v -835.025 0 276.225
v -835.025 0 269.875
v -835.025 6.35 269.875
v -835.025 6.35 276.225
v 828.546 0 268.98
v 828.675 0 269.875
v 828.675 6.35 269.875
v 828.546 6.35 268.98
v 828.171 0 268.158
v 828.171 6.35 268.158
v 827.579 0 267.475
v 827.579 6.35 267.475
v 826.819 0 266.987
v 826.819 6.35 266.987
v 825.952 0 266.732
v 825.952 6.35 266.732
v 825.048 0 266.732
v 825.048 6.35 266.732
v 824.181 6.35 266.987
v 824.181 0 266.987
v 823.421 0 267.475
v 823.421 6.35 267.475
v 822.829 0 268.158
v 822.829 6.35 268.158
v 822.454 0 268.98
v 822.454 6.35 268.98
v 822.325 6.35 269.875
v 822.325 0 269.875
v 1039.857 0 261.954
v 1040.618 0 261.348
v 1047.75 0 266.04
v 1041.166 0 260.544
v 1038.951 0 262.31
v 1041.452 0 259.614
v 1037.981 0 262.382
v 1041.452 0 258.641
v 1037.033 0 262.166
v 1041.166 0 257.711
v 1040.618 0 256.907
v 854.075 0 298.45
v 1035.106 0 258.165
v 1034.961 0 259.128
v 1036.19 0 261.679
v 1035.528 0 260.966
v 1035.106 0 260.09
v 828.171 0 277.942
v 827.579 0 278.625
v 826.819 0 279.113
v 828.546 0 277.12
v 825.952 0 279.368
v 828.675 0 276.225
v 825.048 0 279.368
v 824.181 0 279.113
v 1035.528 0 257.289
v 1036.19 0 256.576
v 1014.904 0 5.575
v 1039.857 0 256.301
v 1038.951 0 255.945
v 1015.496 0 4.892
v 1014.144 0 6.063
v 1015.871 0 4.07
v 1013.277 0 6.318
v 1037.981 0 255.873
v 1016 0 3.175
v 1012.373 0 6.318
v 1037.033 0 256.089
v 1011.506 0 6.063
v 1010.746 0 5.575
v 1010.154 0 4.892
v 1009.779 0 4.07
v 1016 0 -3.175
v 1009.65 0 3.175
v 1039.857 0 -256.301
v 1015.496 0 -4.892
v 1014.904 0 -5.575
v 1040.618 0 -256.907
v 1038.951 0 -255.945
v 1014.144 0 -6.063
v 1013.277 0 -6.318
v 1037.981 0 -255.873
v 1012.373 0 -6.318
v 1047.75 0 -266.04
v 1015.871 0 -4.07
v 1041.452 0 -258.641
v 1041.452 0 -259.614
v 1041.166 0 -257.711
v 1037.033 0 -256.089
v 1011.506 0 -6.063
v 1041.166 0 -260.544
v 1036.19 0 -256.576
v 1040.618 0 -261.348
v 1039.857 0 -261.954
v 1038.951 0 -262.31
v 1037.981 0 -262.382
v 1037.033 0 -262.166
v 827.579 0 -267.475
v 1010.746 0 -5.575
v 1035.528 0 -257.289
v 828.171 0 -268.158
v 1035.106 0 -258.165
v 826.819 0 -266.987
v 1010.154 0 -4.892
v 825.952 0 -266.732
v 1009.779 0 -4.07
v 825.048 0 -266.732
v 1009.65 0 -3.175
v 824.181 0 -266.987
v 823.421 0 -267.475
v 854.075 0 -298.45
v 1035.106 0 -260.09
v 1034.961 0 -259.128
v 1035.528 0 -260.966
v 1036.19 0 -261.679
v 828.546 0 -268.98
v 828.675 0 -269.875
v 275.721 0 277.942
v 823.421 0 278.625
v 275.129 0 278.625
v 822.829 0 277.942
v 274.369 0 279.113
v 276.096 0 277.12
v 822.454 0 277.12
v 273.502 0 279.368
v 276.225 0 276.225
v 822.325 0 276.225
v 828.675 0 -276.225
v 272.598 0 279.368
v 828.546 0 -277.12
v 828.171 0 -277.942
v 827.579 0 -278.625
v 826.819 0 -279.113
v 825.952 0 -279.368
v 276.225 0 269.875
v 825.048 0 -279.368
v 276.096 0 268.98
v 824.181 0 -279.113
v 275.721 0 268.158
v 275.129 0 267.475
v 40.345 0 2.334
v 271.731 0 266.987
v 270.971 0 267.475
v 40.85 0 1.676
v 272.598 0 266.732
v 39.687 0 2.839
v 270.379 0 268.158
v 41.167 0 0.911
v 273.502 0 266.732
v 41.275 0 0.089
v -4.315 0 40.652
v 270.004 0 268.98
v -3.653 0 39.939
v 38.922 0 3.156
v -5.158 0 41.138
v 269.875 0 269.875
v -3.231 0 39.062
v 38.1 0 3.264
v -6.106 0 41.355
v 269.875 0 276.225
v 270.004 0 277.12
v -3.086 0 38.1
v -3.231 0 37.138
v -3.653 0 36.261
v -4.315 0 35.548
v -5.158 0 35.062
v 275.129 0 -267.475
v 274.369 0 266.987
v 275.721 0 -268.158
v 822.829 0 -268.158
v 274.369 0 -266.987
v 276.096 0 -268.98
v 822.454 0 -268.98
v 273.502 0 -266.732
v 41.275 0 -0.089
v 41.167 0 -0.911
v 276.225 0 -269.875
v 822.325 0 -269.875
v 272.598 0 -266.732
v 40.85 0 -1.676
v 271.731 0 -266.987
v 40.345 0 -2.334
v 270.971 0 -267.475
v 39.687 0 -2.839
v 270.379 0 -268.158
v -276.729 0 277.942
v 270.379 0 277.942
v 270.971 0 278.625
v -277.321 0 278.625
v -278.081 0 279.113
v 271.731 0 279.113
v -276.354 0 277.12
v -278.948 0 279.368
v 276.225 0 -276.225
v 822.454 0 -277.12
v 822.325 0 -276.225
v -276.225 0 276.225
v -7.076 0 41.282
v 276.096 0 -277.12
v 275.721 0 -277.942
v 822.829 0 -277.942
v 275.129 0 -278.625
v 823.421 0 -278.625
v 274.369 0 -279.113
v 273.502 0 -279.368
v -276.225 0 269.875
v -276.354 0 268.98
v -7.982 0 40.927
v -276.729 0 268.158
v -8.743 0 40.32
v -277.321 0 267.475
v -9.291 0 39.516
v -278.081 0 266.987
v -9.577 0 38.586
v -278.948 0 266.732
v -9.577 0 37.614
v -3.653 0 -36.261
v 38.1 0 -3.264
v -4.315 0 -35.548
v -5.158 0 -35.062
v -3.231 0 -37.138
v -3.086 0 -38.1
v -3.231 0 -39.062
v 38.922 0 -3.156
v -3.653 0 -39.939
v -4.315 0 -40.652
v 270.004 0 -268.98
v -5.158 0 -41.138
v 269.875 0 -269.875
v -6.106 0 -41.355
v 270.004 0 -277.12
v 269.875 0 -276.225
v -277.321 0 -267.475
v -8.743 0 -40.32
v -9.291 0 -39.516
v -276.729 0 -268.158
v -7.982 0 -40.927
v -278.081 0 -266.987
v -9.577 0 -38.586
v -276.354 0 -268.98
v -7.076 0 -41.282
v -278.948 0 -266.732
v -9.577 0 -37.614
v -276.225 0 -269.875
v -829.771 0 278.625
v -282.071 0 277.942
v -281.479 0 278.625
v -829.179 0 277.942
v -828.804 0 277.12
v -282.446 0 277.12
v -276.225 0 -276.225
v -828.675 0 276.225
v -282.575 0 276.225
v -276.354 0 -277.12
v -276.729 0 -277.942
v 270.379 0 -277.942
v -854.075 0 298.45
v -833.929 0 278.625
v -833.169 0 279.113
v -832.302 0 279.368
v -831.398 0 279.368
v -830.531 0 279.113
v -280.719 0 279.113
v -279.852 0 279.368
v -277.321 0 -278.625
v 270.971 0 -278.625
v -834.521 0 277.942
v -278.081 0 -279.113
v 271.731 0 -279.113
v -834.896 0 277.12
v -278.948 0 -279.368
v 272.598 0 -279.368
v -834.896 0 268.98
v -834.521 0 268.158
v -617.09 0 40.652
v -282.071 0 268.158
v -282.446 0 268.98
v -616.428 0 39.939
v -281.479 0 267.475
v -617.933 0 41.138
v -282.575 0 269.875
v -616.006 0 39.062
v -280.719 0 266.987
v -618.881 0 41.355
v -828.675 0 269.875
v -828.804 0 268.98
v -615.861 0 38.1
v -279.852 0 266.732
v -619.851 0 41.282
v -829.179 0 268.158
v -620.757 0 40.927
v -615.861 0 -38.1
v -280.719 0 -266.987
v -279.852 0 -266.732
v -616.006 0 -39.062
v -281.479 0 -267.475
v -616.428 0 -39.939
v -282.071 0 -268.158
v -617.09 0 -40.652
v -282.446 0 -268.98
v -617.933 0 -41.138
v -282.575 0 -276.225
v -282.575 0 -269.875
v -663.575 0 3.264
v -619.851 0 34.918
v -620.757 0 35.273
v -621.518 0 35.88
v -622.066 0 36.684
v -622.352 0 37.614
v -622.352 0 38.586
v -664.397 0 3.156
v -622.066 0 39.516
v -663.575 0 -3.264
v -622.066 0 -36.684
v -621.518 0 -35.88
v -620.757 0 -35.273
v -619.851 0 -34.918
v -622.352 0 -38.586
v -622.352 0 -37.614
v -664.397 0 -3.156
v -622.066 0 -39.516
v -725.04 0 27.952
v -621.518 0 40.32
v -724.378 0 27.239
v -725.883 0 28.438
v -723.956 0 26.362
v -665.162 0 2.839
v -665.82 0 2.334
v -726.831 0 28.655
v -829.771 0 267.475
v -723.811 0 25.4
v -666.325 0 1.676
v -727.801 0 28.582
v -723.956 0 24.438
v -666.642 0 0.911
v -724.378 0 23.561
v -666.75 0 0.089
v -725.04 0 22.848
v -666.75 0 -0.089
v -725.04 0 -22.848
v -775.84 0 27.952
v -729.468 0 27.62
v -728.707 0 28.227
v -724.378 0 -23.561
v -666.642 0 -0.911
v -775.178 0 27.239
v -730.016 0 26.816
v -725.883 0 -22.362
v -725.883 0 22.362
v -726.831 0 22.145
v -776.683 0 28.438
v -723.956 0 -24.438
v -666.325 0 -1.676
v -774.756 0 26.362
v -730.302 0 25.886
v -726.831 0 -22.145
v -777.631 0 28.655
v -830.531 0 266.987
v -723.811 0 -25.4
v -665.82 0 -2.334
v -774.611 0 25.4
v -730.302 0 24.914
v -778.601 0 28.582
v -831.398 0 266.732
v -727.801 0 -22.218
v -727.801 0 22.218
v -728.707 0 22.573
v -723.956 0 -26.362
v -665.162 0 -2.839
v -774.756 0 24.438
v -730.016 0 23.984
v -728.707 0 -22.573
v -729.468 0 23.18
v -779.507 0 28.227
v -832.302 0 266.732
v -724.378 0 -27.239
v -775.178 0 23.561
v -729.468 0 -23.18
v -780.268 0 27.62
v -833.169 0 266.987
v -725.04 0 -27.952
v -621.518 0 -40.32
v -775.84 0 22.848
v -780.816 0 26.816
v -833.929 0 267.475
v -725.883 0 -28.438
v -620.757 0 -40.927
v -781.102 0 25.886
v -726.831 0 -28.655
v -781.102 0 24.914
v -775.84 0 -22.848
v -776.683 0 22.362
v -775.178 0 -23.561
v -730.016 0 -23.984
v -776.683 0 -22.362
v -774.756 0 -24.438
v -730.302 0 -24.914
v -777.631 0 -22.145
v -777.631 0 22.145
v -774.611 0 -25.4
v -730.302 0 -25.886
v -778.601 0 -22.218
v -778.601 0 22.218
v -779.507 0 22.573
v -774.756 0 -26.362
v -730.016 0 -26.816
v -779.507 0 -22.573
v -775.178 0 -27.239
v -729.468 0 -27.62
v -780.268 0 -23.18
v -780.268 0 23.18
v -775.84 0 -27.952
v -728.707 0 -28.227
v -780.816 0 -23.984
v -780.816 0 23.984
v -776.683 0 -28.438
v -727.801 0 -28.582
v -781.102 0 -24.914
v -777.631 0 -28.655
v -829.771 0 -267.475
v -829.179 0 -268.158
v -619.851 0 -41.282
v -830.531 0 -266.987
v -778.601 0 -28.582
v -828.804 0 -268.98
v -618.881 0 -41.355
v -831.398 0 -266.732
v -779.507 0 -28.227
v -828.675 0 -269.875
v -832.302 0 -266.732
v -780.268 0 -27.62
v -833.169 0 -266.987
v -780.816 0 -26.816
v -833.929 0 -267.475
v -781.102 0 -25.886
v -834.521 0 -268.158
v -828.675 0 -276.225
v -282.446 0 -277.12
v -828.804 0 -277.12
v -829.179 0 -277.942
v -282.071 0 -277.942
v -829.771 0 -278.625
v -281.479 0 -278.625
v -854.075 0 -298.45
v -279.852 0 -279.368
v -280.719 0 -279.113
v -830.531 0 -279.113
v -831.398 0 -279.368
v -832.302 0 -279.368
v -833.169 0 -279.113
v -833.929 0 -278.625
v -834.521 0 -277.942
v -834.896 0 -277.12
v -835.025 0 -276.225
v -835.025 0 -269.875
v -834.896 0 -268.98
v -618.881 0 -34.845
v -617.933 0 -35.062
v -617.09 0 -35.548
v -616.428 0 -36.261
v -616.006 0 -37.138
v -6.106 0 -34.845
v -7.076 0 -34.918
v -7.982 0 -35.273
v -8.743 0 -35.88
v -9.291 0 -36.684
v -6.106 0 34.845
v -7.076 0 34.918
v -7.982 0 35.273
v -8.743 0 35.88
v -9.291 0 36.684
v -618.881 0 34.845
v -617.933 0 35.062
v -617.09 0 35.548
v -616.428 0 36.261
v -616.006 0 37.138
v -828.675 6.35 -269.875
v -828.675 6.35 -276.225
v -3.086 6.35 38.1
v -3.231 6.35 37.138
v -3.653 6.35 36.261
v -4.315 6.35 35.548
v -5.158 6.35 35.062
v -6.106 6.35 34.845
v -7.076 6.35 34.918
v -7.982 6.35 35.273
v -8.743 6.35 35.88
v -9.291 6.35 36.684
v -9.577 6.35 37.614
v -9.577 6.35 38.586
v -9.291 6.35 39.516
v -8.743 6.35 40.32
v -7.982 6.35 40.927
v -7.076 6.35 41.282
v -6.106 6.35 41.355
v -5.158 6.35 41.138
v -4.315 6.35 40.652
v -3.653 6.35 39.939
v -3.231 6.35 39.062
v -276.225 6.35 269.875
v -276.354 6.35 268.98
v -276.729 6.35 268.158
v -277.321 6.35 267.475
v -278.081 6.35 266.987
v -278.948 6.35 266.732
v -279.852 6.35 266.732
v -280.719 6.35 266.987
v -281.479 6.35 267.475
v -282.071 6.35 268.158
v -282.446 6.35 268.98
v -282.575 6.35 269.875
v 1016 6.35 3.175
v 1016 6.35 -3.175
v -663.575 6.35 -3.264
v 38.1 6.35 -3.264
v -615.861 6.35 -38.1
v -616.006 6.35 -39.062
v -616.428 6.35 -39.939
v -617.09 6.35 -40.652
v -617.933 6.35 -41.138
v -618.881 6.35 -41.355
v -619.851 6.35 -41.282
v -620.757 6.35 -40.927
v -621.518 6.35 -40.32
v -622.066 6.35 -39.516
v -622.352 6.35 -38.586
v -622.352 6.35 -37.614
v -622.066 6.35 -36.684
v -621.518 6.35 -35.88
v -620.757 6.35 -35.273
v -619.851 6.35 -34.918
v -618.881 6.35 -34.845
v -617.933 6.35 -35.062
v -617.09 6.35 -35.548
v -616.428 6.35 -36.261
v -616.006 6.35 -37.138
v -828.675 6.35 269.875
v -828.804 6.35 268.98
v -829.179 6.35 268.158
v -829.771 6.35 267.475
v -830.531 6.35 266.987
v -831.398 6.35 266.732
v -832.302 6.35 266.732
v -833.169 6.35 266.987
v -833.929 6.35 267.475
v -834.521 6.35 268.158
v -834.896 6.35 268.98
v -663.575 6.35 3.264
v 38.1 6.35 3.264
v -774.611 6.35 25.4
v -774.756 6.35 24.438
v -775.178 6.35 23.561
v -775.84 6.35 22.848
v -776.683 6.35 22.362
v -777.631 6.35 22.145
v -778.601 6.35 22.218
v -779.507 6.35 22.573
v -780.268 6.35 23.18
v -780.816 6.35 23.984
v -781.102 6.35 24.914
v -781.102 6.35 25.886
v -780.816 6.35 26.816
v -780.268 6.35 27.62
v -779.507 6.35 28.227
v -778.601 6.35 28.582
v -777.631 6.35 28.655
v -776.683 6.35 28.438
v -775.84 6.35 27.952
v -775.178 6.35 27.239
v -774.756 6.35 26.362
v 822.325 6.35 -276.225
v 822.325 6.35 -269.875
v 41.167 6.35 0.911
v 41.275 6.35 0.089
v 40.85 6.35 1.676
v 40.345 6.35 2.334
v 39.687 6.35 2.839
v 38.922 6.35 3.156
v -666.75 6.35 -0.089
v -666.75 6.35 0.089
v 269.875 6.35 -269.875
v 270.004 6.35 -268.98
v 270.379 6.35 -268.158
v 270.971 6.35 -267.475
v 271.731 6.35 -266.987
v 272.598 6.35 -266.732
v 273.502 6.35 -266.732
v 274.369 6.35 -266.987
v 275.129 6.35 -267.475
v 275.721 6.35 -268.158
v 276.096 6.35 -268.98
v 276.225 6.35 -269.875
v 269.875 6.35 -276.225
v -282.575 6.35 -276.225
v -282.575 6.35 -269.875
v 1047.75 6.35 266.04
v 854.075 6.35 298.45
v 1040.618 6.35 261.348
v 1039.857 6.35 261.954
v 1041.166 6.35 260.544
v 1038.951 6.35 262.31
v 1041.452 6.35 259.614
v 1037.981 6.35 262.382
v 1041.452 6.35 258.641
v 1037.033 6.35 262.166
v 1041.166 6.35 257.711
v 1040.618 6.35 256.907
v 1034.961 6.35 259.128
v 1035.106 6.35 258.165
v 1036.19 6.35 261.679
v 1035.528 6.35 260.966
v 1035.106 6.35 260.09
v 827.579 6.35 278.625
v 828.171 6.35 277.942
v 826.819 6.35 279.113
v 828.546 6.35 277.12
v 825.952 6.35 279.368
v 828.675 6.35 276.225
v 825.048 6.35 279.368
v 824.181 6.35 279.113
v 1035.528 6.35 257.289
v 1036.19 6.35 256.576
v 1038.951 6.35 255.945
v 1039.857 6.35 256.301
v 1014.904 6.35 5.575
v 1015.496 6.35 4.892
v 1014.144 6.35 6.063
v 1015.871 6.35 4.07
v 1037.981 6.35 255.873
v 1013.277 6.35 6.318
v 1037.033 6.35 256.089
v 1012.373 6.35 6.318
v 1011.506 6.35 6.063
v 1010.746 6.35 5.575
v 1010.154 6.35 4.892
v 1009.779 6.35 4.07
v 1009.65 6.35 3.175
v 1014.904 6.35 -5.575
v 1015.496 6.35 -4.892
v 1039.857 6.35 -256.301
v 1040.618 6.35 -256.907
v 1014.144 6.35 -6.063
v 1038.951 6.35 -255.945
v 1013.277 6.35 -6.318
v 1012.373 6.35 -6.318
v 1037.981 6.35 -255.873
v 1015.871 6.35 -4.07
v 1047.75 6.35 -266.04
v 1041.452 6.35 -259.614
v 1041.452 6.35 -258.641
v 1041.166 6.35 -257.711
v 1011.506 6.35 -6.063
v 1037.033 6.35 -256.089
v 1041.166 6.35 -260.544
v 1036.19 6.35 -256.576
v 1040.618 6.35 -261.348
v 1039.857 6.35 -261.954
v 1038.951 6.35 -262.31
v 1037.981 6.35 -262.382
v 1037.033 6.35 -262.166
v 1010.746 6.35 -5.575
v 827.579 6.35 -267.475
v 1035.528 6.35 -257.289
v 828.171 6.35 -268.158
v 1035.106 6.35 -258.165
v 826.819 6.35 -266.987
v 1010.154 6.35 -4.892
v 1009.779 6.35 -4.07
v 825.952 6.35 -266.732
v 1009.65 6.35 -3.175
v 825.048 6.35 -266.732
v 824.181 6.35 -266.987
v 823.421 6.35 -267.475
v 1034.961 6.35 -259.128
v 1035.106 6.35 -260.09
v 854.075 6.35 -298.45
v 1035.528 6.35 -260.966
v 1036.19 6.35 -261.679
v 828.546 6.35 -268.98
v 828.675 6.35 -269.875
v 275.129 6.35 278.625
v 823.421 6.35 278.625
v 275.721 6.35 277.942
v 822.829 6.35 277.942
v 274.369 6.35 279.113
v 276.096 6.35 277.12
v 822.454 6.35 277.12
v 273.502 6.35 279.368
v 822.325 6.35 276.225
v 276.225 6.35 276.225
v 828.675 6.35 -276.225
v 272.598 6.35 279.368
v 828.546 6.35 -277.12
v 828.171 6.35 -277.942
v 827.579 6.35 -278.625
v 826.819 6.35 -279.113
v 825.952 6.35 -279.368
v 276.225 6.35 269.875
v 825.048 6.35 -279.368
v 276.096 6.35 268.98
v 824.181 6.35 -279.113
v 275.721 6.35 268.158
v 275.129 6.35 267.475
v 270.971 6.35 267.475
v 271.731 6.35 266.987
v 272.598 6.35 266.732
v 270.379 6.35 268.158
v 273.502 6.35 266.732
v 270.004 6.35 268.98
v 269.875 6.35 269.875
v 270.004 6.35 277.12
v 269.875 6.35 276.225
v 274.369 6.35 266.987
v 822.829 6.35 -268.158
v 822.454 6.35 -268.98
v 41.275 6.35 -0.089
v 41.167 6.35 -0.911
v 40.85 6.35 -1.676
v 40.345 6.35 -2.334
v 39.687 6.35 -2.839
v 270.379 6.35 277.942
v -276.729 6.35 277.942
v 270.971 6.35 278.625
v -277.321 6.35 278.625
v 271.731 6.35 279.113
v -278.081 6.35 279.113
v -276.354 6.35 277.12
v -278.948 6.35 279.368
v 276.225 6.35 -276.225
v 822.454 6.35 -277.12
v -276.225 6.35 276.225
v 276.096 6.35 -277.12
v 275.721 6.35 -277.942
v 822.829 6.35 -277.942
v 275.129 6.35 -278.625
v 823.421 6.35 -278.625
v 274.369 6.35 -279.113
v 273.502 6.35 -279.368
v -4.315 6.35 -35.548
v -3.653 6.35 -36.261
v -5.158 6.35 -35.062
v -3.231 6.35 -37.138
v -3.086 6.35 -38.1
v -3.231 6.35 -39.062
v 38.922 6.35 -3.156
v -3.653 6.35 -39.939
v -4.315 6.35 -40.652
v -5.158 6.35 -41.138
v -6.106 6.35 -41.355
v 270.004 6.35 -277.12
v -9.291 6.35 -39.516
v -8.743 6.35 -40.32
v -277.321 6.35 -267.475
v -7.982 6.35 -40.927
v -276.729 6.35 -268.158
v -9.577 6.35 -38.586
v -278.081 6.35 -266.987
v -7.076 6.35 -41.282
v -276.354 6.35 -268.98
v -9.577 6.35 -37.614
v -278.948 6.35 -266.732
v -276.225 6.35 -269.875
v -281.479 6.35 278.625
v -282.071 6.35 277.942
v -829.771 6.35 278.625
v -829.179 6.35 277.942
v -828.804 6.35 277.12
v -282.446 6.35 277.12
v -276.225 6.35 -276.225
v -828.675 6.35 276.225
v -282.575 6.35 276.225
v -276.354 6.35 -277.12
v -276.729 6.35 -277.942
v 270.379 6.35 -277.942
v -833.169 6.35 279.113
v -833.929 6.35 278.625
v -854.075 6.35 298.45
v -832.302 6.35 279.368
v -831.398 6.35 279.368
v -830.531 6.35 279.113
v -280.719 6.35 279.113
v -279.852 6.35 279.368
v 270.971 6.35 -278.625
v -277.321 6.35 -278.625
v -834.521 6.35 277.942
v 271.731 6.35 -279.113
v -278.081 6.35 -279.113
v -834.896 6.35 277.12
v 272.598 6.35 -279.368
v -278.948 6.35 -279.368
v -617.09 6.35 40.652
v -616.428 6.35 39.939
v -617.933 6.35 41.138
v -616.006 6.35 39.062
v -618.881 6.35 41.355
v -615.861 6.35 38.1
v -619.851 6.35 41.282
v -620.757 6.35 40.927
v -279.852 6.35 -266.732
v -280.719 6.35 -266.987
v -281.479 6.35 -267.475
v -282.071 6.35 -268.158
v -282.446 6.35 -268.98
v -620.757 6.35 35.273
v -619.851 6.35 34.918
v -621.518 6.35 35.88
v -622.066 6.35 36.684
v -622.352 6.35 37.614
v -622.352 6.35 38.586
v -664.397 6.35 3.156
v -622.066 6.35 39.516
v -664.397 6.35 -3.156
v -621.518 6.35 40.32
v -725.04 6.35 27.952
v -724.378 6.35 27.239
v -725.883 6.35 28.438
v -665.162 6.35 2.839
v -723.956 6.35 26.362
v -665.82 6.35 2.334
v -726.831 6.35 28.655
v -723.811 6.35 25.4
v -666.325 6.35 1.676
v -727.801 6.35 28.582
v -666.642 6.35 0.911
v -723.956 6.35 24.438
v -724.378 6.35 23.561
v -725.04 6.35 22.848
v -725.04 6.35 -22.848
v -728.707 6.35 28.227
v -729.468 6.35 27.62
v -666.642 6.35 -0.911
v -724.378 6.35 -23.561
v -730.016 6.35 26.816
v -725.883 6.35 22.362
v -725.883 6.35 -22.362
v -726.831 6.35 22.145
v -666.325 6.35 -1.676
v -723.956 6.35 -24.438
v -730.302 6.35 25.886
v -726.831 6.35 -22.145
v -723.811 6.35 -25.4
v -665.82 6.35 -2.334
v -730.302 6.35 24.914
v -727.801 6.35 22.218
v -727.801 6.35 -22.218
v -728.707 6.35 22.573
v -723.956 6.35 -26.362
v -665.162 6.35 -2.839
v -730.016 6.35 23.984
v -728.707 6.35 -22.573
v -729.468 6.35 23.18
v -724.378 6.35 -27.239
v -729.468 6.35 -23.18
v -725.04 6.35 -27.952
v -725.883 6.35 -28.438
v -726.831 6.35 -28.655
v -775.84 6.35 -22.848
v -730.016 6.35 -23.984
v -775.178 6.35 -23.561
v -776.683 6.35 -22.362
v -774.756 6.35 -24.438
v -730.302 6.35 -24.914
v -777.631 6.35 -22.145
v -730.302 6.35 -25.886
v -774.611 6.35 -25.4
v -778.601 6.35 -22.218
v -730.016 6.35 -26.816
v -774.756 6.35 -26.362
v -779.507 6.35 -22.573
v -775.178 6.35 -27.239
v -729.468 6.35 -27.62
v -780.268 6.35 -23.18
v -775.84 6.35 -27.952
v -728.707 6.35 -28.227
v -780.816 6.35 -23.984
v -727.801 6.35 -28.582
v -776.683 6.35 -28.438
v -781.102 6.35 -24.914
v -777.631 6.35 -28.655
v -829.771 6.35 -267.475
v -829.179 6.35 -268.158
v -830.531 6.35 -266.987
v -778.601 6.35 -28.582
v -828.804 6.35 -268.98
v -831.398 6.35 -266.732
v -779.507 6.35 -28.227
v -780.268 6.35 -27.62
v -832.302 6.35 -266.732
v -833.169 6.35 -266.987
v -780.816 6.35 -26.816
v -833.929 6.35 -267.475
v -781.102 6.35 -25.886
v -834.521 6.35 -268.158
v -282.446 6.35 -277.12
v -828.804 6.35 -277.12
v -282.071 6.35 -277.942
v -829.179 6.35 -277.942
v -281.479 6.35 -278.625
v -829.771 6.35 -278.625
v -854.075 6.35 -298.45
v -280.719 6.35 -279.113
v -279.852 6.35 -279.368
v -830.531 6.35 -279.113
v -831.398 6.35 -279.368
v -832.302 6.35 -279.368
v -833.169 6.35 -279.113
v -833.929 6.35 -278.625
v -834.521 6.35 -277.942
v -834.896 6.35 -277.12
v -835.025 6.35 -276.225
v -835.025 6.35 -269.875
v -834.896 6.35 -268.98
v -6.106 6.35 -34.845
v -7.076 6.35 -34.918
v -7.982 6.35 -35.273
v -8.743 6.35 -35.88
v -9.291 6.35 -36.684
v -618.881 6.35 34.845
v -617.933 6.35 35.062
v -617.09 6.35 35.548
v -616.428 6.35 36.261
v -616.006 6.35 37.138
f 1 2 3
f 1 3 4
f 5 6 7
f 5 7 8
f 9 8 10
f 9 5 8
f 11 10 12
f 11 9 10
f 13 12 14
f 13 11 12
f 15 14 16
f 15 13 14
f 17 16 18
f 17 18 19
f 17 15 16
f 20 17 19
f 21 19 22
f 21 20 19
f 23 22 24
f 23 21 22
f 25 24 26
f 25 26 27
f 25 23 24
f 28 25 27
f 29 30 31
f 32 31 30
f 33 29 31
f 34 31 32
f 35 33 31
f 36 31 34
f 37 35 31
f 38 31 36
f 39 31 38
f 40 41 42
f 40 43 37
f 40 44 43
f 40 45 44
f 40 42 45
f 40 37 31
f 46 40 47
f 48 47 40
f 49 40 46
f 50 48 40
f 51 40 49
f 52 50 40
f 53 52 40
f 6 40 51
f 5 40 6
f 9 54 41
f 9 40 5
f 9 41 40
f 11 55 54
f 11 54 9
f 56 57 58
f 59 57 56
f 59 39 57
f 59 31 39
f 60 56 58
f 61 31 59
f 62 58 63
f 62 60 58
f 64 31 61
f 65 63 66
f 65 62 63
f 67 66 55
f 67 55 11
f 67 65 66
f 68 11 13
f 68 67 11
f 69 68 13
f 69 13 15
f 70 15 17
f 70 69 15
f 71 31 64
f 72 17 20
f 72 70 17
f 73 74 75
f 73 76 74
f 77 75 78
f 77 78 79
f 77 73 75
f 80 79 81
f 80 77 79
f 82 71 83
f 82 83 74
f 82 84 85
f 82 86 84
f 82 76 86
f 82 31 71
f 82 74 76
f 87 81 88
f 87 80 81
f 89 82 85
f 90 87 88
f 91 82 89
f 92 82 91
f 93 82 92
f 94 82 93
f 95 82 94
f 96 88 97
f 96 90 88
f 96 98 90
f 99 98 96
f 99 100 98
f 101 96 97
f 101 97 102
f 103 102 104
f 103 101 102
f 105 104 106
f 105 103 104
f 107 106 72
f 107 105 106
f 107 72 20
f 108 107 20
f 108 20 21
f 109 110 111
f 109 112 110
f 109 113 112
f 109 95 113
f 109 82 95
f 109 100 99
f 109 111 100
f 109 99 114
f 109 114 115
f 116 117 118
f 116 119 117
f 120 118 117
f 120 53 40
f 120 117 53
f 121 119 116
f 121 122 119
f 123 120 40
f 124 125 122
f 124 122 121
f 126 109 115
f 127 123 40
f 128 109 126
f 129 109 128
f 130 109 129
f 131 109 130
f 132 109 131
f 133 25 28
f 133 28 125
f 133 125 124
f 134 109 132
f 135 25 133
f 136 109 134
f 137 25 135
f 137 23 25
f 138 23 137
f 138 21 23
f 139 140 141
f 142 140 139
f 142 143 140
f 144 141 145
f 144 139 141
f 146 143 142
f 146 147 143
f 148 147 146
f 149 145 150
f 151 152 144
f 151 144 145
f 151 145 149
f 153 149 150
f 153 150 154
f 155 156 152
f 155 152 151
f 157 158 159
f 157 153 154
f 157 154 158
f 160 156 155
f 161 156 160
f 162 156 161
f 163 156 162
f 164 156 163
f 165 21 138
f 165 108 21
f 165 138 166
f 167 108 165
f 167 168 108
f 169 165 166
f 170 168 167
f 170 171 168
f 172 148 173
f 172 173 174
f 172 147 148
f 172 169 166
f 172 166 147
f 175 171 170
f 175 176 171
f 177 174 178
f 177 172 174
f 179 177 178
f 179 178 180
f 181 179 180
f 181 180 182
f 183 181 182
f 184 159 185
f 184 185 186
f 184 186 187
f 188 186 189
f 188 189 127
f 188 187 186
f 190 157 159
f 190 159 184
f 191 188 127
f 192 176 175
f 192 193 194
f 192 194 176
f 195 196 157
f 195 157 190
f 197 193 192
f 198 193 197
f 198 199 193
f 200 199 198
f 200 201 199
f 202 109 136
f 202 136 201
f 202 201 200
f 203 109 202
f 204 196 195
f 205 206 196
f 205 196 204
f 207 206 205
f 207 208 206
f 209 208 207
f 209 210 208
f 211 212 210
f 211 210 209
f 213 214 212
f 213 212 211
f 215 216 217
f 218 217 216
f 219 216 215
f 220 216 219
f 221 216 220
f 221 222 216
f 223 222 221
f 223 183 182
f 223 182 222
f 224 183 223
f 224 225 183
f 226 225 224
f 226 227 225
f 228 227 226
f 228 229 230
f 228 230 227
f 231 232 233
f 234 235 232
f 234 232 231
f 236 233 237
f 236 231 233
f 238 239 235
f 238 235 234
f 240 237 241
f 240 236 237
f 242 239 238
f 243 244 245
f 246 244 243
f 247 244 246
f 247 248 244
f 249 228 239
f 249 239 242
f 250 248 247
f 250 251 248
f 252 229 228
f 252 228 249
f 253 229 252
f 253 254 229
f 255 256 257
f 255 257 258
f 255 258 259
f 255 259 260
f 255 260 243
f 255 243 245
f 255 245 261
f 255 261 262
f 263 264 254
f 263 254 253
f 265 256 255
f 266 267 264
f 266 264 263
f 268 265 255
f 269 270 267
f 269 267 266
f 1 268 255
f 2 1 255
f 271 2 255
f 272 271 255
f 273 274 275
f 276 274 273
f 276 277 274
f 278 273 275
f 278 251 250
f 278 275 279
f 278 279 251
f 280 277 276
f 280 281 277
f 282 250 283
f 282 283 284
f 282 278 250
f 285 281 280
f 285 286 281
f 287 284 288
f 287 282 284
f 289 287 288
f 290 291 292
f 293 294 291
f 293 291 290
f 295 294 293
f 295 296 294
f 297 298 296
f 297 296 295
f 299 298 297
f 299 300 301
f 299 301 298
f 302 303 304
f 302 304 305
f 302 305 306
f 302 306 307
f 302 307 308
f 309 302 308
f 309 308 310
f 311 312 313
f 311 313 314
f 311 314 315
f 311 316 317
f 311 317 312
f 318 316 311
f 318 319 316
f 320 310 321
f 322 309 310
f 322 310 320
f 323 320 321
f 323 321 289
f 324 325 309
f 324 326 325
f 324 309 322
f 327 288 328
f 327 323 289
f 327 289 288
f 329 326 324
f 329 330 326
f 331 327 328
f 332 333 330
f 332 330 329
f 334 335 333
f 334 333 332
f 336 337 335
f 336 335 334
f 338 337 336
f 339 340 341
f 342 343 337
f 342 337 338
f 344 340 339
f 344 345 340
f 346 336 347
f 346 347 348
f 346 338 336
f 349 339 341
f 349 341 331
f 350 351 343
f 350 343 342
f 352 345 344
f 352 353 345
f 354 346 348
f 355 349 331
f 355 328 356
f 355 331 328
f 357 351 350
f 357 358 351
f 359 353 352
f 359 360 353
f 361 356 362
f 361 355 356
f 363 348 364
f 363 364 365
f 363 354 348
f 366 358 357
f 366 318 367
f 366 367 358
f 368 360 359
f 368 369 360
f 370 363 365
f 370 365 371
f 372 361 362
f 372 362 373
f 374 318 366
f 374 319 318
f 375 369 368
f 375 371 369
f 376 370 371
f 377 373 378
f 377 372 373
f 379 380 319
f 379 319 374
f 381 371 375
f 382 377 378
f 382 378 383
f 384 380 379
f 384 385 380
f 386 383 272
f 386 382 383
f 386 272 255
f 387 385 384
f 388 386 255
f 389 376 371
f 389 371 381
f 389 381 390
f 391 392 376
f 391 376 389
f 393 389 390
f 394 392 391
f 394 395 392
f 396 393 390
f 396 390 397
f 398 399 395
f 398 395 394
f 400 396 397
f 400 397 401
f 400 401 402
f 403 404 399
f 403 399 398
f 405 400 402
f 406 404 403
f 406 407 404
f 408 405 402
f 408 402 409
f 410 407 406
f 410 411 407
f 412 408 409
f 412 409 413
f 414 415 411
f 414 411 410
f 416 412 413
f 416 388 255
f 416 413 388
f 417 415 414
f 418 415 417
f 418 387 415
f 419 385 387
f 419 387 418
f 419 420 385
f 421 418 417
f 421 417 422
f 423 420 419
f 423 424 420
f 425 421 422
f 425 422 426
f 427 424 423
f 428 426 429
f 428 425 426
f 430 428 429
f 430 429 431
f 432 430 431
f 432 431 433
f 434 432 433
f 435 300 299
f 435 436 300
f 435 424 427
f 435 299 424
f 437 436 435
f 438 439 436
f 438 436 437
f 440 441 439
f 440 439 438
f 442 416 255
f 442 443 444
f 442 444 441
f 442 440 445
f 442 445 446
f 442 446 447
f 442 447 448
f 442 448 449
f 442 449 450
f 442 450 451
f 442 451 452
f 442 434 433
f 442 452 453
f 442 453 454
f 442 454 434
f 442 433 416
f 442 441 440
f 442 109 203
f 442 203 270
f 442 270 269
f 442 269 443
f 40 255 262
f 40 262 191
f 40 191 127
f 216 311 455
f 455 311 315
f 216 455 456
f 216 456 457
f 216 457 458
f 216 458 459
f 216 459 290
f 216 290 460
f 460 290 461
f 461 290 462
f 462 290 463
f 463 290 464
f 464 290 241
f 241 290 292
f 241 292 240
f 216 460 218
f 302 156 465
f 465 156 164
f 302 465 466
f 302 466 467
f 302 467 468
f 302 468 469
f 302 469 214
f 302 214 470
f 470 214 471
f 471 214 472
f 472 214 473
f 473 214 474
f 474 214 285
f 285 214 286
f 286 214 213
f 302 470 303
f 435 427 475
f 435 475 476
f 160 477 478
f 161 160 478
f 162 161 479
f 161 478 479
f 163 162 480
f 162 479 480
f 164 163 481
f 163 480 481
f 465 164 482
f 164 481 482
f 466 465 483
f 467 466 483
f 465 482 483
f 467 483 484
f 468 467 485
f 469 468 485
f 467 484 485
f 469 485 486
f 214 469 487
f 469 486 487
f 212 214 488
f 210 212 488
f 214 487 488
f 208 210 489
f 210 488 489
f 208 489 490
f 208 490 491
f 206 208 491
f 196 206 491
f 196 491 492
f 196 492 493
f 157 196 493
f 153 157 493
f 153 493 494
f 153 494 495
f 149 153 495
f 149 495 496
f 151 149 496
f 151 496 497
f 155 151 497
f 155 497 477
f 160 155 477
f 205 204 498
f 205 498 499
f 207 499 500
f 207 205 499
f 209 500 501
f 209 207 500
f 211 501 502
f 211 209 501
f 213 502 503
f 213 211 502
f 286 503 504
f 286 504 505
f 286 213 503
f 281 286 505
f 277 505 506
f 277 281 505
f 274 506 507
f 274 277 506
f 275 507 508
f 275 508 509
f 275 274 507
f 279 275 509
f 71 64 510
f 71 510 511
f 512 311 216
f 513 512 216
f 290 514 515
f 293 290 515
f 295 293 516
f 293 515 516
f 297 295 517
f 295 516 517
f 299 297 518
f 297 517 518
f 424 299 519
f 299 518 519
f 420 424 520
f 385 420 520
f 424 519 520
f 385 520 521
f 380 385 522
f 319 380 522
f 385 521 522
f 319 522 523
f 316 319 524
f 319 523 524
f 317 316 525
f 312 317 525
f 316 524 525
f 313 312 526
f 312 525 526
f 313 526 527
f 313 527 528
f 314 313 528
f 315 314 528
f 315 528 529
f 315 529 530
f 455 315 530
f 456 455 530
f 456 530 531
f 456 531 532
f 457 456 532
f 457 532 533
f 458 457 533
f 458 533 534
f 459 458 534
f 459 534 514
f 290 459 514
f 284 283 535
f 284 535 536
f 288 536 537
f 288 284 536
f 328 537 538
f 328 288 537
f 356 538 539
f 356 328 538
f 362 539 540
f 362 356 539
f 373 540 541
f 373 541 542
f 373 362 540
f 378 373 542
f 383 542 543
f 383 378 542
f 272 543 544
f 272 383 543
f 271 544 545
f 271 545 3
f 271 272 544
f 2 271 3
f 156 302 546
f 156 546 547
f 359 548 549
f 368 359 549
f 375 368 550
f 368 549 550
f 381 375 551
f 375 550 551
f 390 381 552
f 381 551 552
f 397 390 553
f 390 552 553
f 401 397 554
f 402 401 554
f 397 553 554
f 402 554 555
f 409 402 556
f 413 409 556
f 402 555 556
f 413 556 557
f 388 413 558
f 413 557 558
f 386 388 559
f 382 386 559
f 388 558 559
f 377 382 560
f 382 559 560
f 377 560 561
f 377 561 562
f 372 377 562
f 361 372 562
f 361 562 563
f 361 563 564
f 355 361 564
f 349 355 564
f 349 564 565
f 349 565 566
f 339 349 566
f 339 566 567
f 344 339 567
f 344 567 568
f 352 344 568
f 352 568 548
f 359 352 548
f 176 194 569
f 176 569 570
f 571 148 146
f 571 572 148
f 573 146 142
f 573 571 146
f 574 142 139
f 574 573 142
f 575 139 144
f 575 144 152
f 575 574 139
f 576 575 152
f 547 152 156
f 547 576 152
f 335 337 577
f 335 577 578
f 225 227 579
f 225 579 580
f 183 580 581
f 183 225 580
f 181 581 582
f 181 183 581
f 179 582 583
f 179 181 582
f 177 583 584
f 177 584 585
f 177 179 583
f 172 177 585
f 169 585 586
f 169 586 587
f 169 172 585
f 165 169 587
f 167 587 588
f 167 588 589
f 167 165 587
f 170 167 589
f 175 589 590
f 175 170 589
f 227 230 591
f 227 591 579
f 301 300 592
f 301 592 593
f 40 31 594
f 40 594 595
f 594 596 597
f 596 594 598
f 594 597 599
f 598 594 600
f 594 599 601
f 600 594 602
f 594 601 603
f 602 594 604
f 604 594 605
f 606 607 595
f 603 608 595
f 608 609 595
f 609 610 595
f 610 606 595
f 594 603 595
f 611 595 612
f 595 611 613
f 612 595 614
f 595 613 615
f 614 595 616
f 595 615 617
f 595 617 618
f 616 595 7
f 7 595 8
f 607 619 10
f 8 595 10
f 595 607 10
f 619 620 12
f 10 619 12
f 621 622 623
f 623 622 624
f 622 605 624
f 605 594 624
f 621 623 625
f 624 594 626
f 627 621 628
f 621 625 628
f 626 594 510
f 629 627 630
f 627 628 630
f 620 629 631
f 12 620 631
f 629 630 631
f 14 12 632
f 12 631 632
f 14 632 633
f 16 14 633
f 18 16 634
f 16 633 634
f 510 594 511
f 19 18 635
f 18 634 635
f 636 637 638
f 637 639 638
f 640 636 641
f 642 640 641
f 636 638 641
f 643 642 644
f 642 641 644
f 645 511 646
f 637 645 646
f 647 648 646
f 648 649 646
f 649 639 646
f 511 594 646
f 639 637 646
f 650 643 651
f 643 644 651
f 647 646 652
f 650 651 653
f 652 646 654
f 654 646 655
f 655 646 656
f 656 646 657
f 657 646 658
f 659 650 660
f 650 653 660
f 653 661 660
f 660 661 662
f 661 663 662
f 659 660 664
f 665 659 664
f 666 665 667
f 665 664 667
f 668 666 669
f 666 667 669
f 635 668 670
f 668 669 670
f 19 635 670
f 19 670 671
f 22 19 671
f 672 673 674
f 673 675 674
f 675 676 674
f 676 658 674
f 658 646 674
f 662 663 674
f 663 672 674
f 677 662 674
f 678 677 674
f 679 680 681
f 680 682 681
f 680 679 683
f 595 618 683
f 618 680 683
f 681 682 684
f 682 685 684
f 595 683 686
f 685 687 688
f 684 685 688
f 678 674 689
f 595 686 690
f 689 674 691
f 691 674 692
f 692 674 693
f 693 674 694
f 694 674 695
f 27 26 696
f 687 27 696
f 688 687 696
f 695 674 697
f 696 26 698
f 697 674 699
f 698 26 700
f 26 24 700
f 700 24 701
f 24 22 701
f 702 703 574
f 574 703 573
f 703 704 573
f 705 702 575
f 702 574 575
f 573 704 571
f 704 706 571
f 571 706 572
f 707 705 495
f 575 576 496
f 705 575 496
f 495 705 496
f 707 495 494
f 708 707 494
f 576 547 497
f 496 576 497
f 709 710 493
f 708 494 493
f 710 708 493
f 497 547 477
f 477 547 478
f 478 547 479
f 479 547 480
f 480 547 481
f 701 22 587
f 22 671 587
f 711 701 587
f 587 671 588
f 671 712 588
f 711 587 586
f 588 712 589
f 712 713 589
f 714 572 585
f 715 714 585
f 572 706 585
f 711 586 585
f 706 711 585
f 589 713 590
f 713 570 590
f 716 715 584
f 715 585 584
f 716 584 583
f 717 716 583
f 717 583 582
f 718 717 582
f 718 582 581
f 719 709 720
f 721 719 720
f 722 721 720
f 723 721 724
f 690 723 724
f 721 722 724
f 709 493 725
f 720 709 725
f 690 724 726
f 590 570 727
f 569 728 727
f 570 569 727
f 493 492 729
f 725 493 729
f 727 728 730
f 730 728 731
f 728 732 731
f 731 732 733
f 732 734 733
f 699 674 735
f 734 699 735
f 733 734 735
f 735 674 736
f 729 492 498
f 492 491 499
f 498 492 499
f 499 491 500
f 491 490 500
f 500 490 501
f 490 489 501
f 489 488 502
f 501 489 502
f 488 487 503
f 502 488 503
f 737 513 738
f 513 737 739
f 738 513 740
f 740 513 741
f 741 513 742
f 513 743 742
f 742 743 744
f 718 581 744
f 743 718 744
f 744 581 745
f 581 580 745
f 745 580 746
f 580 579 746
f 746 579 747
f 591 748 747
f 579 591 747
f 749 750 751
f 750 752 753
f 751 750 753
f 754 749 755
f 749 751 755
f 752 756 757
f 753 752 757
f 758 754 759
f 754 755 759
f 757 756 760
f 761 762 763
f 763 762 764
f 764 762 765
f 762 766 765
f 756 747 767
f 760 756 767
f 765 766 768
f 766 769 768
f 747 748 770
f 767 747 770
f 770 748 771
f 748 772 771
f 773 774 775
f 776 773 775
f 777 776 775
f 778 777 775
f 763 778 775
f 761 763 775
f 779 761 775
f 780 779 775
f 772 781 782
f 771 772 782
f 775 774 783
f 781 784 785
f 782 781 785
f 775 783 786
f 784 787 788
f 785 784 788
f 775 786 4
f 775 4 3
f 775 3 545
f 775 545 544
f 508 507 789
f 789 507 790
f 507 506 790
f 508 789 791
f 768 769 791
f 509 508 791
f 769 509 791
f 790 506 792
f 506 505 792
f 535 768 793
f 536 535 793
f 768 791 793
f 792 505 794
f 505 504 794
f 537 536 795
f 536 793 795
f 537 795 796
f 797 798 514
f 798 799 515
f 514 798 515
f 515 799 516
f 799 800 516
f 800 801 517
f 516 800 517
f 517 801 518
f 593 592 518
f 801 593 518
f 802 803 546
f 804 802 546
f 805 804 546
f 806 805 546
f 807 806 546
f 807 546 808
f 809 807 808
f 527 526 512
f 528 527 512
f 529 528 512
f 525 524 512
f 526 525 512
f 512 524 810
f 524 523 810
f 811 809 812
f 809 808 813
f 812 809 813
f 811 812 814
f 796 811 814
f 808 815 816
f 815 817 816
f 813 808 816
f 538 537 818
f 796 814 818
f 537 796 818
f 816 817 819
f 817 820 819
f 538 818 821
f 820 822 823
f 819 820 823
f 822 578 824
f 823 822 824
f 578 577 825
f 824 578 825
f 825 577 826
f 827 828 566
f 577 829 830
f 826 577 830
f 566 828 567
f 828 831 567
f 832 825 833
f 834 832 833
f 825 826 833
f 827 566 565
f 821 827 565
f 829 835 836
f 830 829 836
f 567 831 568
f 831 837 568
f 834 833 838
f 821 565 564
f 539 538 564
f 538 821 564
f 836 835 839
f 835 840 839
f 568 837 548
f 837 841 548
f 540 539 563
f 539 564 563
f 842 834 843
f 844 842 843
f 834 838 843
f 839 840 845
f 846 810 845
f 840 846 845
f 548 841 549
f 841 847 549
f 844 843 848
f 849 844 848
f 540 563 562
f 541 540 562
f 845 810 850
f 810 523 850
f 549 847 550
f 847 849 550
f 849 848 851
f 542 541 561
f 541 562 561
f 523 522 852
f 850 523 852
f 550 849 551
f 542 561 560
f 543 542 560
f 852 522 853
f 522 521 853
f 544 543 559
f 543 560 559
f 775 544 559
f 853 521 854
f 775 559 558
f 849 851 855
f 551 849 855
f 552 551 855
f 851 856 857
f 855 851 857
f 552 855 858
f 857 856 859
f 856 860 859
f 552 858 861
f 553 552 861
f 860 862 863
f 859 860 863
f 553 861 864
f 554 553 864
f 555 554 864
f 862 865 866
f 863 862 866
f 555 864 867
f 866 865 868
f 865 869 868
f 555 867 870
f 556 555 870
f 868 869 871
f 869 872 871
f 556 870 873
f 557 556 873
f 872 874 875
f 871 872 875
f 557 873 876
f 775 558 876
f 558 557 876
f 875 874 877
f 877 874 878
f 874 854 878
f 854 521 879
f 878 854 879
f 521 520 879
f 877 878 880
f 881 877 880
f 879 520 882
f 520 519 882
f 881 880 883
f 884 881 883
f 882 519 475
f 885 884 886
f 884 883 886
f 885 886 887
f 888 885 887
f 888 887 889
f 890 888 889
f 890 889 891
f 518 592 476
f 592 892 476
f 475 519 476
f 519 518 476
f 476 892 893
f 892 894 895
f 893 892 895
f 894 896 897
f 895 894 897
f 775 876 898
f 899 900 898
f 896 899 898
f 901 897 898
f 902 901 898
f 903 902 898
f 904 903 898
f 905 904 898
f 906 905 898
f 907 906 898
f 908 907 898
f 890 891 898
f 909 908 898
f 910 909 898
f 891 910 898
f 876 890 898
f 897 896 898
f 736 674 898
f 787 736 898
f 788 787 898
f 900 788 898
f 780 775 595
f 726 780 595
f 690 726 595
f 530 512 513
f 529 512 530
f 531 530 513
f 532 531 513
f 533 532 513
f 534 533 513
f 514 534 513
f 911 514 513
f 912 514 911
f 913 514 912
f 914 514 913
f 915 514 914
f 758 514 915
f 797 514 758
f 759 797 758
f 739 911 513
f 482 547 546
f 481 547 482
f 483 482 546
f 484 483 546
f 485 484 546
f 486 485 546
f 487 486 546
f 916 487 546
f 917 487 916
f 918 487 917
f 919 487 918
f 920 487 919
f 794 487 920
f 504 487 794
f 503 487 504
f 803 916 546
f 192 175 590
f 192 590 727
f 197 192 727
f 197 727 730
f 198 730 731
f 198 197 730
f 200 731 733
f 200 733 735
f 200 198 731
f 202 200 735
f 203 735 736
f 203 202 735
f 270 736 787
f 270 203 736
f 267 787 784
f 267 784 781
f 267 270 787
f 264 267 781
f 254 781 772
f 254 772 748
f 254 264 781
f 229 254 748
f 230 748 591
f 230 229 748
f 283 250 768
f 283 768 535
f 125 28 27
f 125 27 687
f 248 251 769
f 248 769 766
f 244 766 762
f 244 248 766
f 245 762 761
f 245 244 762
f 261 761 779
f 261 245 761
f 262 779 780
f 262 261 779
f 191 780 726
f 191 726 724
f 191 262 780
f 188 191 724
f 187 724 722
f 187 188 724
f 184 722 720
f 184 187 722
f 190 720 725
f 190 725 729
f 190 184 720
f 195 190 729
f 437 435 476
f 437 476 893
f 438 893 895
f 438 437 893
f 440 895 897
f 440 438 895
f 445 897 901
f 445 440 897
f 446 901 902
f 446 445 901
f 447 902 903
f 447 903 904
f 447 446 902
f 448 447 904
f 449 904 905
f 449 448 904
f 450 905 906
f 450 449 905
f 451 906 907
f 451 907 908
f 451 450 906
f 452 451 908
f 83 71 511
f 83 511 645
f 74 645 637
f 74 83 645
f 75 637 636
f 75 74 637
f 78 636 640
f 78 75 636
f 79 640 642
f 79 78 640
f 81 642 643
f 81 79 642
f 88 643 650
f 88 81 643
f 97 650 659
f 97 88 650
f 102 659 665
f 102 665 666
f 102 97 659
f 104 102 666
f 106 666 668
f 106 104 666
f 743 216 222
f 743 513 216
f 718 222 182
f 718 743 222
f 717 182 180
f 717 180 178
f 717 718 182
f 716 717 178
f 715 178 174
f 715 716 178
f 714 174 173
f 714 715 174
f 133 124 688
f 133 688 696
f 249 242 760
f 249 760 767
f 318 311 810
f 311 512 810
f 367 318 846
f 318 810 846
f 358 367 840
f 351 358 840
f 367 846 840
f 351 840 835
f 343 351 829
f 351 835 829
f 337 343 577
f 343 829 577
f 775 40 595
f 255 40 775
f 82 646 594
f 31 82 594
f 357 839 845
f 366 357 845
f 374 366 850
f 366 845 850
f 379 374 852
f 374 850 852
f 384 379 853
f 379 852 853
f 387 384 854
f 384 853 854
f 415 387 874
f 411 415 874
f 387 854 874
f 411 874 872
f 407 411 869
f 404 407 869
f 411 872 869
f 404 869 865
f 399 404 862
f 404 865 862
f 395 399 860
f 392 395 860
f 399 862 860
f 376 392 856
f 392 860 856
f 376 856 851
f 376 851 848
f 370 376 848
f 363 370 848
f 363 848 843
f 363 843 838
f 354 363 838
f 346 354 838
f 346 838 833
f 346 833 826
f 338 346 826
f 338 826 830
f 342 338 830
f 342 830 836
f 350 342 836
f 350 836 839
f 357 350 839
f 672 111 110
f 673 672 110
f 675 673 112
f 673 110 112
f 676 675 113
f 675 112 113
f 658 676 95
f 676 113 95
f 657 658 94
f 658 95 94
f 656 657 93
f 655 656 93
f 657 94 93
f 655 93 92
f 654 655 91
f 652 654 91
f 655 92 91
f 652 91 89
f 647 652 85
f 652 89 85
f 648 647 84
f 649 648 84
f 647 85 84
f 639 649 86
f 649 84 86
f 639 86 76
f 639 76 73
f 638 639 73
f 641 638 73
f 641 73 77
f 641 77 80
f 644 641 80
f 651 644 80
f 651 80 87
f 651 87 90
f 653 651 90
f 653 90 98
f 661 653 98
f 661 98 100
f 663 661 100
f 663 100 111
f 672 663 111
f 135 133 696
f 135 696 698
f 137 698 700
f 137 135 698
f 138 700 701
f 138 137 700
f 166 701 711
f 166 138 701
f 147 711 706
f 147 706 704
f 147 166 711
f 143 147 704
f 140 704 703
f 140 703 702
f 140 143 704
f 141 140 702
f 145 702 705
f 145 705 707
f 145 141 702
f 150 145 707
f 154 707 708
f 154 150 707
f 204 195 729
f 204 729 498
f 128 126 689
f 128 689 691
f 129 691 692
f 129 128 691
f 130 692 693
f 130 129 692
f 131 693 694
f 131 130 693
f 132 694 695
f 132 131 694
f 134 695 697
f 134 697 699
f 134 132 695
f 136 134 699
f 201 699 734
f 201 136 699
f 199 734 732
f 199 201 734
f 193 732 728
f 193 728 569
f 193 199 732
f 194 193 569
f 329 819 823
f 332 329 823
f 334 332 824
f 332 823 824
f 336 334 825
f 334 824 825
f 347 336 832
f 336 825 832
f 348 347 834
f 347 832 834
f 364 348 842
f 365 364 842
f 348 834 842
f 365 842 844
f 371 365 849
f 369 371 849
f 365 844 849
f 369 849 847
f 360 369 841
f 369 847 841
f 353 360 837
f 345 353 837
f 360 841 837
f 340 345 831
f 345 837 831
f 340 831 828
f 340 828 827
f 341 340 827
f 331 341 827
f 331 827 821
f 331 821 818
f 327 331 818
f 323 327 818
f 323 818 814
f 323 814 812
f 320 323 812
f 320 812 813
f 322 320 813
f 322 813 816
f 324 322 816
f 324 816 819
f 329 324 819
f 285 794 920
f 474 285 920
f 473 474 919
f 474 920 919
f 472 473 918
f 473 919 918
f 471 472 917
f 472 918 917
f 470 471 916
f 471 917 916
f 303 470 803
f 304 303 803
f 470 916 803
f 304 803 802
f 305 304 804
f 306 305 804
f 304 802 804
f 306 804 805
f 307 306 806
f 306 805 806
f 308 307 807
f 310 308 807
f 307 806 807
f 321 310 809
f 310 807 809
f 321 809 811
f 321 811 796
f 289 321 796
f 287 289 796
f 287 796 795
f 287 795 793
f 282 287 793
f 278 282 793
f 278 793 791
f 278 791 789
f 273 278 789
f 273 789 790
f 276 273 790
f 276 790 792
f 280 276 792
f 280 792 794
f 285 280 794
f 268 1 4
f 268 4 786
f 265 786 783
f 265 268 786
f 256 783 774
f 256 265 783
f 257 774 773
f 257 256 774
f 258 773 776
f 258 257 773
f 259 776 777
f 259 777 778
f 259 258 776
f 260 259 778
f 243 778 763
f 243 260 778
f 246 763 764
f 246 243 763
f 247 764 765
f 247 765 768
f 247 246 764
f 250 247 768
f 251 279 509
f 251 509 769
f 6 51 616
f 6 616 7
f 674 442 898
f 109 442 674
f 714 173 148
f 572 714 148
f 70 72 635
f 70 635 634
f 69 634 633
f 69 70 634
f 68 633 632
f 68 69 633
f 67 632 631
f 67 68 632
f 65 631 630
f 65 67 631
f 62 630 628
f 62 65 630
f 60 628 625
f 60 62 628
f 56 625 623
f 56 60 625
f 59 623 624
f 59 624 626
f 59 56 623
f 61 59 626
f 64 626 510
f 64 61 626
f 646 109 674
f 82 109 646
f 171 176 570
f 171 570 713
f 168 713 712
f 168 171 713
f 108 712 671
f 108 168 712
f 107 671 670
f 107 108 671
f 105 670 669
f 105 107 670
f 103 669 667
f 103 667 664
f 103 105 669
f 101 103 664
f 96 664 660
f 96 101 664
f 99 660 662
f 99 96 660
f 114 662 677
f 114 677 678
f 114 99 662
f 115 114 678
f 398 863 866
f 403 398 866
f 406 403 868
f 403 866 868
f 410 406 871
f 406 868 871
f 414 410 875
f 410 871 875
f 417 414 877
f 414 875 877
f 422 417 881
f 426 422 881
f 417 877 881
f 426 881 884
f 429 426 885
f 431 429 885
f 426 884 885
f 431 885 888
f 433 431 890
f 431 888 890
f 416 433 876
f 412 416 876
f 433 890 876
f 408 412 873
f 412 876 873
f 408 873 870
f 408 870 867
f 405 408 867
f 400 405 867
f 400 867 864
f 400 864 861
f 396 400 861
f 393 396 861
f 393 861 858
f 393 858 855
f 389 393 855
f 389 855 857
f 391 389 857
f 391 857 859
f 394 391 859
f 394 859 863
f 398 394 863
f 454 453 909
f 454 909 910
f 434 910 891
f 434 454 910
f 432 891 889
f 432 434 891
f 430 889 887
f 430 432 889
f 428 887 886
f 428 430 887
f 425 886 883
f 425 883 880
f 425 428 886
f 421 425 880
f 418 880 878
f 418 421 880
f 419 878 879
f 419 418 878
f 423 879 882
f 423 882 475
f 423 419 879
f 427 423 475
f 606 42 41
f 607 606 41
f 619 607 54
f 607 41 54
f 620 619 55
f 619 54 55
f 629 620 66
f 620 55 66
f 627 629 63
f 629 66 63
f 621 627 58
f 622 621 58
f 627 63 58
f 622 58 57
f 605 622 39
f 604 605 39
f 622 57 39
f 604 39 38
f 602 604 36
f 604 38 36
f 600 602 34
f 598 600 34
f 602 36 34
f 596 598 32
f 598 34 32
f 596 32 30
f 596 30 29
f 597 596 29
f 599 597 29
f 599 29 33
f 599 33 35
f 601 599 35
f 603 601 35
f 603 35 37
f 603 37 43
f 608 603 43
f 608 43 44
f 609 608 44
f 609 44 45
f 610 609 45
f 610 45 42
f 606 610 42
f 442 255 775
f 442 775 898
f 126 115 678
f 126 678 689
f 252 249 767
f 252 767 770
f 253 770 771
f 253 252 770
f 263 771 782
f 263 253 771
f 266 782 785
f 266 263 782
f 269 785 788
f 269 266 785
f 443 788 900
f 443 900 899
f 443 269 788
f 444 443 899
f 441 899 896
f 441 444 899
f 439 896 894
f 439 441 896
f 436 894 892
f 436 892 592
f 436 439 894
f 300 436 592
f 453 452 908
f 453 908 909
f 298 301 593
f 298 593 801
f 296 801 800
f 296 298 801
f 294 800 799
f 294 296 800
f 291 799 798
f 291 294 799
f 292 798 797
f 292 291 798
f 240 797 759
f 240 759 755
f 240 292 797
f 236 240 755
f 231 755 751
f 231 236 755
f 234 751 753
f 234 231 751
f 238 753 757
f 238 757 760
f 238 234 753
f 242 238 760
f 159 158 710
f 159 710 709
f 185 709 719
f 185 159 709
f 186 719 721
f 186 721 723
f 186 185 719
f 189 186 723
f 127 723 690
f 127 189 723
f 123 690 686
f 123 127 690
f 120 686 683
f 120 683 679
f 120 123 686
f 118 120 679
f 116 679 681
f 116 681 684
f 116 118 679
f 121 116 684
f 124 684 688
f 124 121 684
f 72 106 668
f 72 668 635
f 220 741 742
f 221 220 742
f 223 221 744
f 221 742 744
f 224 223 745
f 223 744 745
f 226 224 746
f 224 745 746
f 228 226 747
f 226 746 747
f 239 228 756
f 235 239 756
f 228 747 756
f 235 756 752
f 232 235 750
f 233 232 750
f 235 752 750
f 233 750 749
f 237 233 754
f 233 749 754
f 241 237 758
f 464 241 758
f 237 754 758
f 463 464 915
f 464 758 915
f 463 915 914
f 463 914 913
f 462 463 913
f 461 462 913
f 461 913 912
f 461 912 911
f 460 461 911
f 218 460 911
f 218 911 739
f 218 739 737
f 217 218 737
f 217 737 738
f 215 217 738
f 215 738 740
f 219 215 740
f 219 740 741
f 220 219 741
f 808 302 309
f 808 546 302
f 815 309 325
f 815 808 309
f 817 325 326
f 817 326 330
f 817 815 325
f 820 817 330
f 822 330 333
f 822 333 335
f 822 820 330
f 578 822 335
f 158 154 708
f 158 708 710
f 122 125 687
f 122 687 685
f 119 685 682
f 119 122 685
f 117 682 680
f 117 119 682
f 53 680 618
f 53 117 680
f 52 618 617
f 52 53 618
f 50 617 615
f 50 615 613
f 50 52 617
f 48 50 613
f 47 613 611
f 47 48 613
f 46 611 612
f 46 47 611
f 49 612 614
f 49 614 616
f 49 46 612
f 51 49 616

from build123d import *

# Parameters (mm, degrees)
BOSS_EXTRUDE1_DEPTH             = 6.35
F_1_4_0_25_DIAMETER_SLOT2_DEPTH = 6.35
CUT_EXTRUDE2_REACH              = 1094.5
F_0_257_DIAMETER_HOLE3_D        = 6.5278
F_0_257_DIAMETER_HOLE2_D        = 6.5278
SKETCH32_W                      = 708.025
SKETCH32_H                      = 6.5278
CUT_EXTRUDE5_DEPTH              = 1090.446092058
FILLET3_R                       = 3.175
F_0_257_DIAMETER_HOLE1_D        = 6.5278


# Read off the part's stored shape, not the designer's step: 1/4 (0.25) Diameter Slot2
with BuildPart() as part:
    # Sketch1 → Boss-Extrude1 (new body)
    with BuildSketch(Plane(origin=(0, 0, 0), x_dir=(1, 0, 0), z_dir=(0, 1, 0))):
        Polygon((854.075, 298.45), (1050.925, 265.508607402), (1050.925, -265.508607402), (854.075, -298.45), (-854.075, -298.45), (-854.075, 298.45), align=None)
    extrude(amount=BOSS_EXTRUDE1_DEPTH)

    # 1/4 (0.25) Diameter Slot2 outline → 1/4 (0.25) Diameter Slot2 (cut)
    with BuildSketch(Plane(origin=(0, 0, 0), x_dir=(1, 0, 0), z_dir=(0, 1, 0))):
        with BuildLine():
            ThreePointArc((1016, 3.175), (1012.825, 6.35), (1009.65, 3.175))
            Line((1009.65, 3.175), (1009.65, -3.175))
            ThreePointArc((1009.65, -3.175), (1012.825, -6.35), (1016, -3.175))
            Line((1016, -3.175), (1016, 3.175))
        make_face()
        with BuildLine():
            ThreePointArc((828.675, 276.225), (825.5, 279.4), (822.325, 276.225))
            Line((822.325, 276.225), (822.325, 269.875))
            ThreePointArc((822.325, 269.875), (825.5, 266.7), (828.675, 269.875))
            Line((828.675, 269.875), (828.675, 276.225))
        make_face()
        with BuildLine():
            Line((828.675, -276.225), (828.675, -269.875))
            ThreePointArc((828.675, -269.875), (825.5, -266.7), (822.325, -269.875))
            Line((822.325, -269.875), (822.325, -276.225))
            ThreePointArc((822.325, -276.225), (825.5, -279.4), (828.675, -276.225))
        make_face()
        with BuildLine():
            ThreePointArc((276.225, 276.225), (273.05, 279.4), (269.875, 276.225))
            Line((269.875, 276.225), (269.875, 269.875))
            ThreePointArc((269.875, 269.875), (273.05, 266.7), (276.225, 269.875))
            Line((276.225, 269.875), (276.225, 276.225))
        make_face()
        with BuildLine():
            Line((276.225, -276.225), (276.225, -269.875))
            ThreePointArc((276.225, -269.875), (273.05, -266.7), (269.875, -269.875))
            Line((269.875, -269.875), (269.875, -276.225))
            ThreePointArc((269.875, -276.225), (273.05, -279.4), (276.225, -276.225))
        make_face()
        with BuildLine():
            ThreePointArc((-276.225, 276.225), (-279.4, 279.4), (-282.575, 276.225))
            Line((-282.575, 276.225), (-282.575, 269.875))
            ThreePointArc((-282.575, 269.875), (-279.4, 266.7), (-276.225, 269.875))
            Line((-276.225, 269.875), (-276.225, 276.225))
        make_face()
        with BuildLine():
            Line((-276.225, -276.225), (-276.225, -269.875))
            ThreePointArc((-276.225, -269.875), (-279.4, -266.7), (-282.575, -269.875))
            Line((-282.575, -269.875), (-282.575, -276.225))
            ThreePointArc((-282.575, -276.225), (-279.4, -279.4), (-276.225, -276.225))
        make_face()
        with BuildLine():
            ThreePointArc((-828.675, 276.225), (-831.85, 279.4), (-835.025, 276.225))
            Line((-835.025, 276.225), (-835.025, 269.875))
            ThreePointArc((-835.025, 269.875), (-831.85, 266.7), (-828.675, 269.875))
            Line((-828.675, 269.875), (-828.675, 276.225))
        make_face()
        with BuildLine():
            Line((-828.675, -276.225), (-828.675, -269.875))
            ThreePointArc((-828.675, -269.875), (-831.85, -266.7), (-835.025, -269.875))
            Line((-835.025, -269.875), (-835.025, -276.225))
            ThreePointArc((-835.025, -276.225), (-831.85, -279.4), (-828.675, -276.225))
        make_face()
    extrude(amount=F_1_4_0_25_DIAMETER_SLOT2_DEPTH, mode=Mode.SUBTRACT)

    # Sketch18 → Cut-Extrude2 (cut, up to next)
    with BuildSketch(Plane(origin=(0, 6.35, 0), x_dir=(1, 0, 0), z_dir=(0, 1, 0)), mode=Mode.PRIVATE) as cut_extrude2_sk1:
        Polygon((1047.75, -266.039920186), (1050.925, -265.508607402), (1050.925, 265.508607402), (1047.75, 266.039920186), align=None)
    cut_extrude2_tool1 = extrude(cut_extrude2_sk1.sketch, amount=-CUT_EXTRUDE2_REACH, mode=Mode.PRIVATE) & part.part
    add(cut_extrude2_tool1.solids().sort_by_distance((1049.336971, 6.35, 0))[0], mode=Mode.SUBTRACT)

    # F (0.257) Diameter Hole3 (through all)
    with Locations(Plane(origin=(0, 6.35, 0), x_dir=(1, 0, 0), z_dir=(0, 1, 0))):
        with Locations((1038.225, -259.127502839), (1038.225, 259.127502839)):
            Hole(F_0_257_DIAMETER_HOLE3_D / 2)

    # F (0.257) Diameter Hole2 (through all)
    with Locations(Plane(origin=(0, 0, 0), x_dir=(-1, 0, 0), z_dir=(0, -1, 0))):
        with Locations((777.875, 25.4), (777.875, -25.4), (727.075, -25.4), (727.075, 25.4)):
            Hole(F_0_257_DIAMETER_HOLE2_D / 2)

    # Sketch32 → Cut-Extrude5 (cut, through all)
    with BuildSketch(Plane.XZ):
        with Locations((-312.7375, 0)):
            Rectangle(SKETCH32_W, SKETCH32_H)
    extrude(amount=-CUT_EXTRUDE5_DEPTH, mode=Mode.SUBTRACT)

    # Fillet3
    fillet3_edges = [part.edges().sort_by_distance(p)[0] for p in [
        (41.275, 3.175, 3.2639),
        (41.275, 3.175, -3.2639),
        (-666.75, 3.175, -3.2639),
        (-666.75, 3.175, 3.2639),
    ]]
    fillet(fillet3_edges, radius=FILLET3_R)

    # F (0.257) Diameter Hole1 (through all)
    with Locations(Plane(origin=(0, 0, 0), x_dir=(-1, 0, 0), z_dir=(0, -1, 0))):
        with Locations((619.125, 38.1), (6.35, 38.1), (619.125, -38.1), (6.35, -38.1)):
            Hole(F_0_257_DIAMETER_HOLE1_D / 2)


solid = part.part
